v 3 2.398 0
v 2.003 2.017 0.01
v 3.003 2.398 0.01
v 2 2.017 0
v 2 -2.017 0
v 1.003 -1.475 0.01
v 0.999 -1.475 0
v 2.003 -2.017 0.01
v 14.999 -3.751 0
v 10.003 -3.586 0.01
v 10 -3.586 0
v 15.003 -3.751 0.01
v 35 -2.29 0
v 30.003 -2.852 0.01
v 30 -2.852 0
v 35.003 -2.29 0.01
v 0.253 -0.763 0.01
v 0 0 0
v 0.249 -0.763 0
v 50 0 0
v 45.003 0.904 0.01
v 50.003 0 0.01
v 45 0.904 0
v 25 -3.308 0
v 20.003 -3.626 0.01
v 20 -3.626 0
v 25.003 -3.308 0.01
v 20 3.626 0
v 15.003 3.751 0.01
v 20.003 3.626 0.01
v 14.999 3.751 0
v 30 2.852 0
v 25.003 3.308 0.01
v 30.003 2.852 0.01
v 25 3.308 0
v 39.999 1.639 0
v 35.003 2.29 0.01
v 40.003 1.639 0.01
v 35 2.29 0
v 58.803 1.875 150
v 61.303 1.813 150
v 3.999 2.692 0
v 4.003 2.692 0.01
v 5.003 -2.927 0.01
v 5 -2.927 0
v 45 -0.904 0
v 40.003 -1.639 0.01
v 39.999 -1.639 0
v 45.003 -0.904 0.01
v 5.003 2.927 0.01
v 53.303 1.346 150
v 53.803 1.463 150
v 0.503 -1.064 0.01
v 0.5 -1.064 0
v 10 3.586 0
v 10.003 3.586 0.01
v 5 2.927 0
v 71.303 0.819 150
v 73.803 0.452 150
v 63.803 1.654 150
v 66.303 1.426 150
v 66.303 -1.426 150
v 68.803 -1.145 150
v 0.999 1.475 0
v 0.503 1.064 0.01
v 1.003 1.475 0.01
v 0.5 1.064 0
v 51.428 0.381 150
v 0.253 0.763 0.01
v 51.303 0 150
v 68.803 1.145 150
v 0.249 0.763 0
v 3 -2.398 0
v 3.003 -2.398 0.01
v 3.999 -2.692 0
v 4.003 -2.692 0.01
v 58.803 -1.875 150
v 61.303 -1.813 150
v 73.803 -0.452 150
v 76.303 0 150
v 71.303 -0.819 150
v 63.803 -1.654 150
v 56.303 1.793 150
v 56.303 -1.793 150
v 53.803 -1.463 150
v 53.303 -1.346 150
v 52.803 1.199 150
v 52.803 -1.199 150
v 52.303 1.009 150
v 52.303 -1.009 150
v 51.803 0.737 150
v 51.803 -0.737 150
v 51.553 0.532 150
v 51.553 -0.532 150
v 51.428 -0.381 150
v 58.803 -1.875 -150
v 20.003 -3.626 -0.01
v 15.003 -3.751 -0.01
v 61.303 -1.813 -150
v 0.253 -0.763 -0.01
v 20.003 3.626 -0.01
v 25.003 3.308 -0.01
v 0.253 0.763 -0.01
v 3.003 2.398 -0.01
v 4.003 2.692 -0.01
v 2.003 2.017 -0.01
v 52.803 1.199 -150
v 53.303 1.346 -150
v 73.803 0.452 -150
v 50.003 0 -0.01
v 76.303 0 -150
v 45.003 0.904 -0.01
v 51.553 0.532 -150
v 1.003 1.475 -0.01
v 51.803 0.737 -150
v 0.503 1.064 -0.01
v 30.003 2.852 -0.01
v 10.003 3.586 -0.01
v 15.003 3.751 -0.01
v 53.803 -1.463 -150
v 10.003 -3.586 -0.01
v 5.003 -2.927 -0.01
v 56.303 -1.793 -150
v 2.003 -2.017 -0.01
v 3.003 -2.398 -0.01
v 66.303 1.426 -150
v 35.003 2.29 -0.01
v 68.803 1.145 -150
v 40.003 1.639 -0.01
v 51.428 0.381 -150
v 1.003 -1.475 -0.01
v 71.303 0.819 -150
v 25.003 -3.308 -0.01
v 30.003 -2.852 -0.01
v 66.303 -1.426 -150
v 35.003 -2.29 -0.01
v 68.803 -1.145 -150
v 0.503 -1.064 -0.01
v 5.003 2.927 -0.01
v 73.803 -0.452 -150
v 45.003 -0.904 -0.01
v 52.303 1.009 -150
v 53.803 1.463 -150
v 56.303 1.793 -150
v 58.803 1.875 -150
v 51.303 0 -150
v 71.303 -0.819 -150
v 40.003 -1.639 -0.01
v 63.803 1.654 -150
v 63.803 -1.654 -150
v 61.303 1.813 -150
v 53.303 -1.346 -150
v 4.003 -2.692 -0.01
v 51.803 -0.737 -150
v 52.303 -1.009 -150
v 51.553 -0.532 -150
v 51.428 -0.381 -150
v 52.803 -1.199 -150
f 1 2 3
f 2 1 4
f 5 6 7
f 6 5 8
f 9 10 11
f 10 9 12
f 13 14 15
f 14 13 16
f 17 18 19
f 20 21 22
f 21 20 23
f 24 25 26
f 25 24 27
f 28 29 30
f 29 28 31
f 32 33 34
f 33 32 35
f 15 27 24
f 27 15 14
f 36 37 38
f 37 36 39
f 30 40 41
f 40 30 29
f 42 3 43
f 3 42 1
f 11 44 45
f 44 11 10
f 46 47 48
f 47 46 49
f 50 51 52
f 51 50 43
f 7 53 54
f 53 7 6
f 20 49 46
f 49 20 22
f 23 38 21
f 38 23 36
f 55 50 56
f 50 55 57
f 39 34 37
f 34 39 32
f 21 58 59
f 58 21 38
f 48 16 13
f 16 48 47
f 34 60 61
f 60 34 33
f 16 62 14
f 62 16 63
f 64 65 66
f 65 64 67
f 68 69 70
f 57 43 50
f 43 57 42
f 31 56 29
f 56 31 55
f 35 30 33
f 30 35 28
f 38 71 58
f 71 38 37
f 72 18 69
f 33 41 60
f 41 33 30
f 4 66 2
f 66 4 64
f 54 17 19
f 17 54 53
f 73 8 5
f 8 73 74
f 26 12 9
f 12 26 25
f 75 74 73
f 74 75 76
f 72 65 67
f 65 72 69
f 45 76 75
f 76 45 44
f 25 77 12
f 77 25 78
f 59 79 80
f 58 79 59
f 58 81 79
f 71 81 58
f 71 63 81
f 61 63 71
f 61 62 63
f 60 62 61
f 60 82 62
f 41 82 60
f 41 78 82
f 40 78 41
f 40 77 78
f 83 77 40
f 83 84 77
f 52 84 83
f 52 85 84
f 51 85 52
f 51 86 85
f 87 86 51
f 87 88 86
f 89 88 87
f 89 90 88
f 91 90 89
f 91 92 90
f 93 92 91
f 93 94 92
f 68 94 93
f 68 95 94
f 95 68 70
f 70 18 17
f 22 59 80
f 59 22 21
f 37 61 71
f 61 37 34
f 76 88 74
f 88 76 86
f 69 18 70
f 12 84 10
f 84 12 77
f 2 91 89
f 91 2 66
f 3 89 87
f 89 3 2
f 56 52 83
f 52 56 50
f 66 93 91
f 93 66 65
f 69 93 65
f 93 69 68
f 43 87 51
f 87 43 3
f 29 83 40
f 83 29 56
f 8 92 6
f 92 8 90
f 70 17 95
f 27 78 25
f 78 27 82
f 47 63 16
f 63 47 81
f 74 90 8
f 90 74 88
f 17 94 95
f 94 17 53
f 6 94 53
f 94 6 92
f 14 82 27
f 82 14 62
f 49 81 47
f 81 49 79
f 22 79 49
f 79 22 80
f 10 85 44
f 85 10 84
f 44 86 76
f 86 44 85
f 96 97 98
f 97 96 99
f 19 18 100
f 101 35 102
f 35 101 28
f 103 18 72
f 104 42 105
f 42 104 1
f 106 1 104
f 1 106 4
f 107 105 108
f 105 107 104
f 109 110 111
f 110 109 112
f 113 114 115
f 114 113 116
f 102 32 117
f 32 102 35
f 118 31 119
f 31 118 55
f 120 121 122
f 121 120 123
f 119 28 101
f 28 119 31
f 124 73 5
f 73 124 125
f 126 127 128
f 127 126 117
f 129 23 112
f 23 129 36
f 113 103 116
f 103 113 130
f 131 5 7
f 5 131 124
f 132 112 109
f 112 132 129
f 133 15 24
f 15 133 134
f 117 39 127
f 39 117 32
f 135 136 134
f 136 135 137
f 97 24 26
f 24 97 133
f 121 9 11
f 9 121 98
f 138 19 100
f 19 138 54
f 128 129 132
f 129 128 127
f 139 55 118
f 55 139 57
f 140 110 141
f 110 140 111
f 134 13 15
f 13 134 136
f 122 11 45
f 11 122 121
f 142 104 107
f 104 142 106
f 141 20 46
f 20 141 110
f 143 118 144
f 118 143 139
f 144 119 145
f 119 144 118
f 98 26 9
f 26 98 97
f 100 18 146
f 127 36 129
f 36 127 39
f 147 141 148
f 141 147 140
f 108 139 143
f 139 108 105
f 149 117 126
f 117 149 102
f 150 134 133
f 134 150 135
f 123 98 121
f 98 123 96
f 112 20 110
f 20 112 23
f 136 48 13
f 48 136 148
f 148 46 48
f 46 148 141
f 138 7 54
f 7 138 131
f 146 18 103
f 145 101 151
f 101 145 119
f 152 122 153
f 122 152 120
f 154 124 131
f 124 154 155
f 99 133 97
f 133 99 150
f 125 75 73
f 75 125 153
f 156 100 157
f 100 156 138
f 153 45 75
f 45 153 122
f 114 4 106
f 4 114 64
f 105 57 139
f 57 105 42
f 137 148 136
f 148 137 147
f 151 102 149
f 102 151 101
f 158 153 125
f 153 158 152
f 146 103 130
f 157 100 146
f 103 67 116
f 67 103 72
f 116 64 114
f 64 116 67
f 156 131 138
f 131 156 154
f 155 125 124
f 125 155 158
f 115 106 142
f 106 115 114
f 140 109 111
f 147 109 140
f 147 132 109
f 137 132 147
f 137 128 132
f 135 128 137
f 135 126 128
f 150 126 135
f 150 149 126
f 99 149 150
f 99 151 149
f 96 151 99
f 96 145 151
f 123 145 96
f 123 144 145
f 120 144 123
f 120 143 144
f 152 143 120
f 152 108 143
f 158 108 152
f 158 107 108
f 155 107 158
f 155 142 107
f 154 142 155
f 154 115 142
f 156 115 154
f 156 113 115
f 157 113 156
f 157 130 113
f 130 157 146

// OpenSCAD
// [FL_INDEX: keywords="openscad, 3d_parametric, Customizable_Airfoil, csg_solid" | COT="Parametric OpenSCAD design from 3DCodeverse"]
// Title: Customizable Airfoil

// Parametric NACA 00xx airfoil.
// See http://en.wikipedia.org/wiki/NACA_airfoil

// preview[view:south, tilt:top diagonal]

WINGS = 2; // [2:Dual Wings, 1:Single Wing]

// Wing chord (leading edge to trailing edge)
CHORD = 50;

// Wing length (root to tip)
LENGTH = 150;

// Max wing thickness (as percentage of chord length)
t = 15;

// Scale proportion of wing tip vs. wing root
TAPER = 0.5;

// Sweep back angle of wing
SWEEP_ANGLE = 20;

/* [Hidden] */
E = 0.01;

function y(x) = t / 20.0 *
         (.2969 * sqrt(x)
          -0.1260 * x
          -0.3516 * pow(x, 2)
          +0.2843 * pow(x, 3)
          -0.1015 * pow(x, 4));

// Argh!  No for loop initializer in open scad!
a = [[0.0, y(0.0)],
     [0.005, y(0.005)],
     [0.01, y(0.01)],
     [0.02, y(0.02)], [0.04, y(0.04)], [0.06, y(0.06)], [0.08, y(0.08)],
     [0.1, y(0.1)],
     [0.2, y(0.2)],
     [0.3, y(0.3)],
     [0.4, y(0.4)],
     [0.5, y(0.5)],
     [0.6, y(0.6)],
     [0.7, y(0.7)],
     [0.8, y(0.8)],
     [0.9, y(0.9)],
     [1.0, 0.0],
     [0.9, -y(0.9)],
     [0.8, -y(0.8)],
     [0.7, -y(0.7)],
     [0.6, -y(0.6)],
     [0.5, -y(0.5)],
     [0.4, -y(0.4)],
     [0.3, -y(0.3)],
     [0.2, -y(0.2)],
     [0.1, -y(0.1)],
     [0.08, -y(0.08)], [0.06, -y(0.06)], [0.04, -y(0.04)], [0.02, -y(0.02)],
     [0.01, -y(0.01)],
     [0.005, -y(0.005)],
     [0.0, -y(0.0)]
     ];

module naca_2d(chord) {
  scale([chord, chord, 1])
    polygon(points=a);
}

module naca_25d(chord) {
  linear_extrude(height=E) naca_2d(chord);
}

module reflect_z() {
  multmatrix(m=[[1, 0, 0, 0],
                [0, 1, 0, 0],
                [0, 0, -1, 0],
                [0, 0, 0, 1]])
    child(0);
}

module naca(chord, length, taper=1, sweep_ang=0) {
  sweep = sin(sweep_ang);
  multmatrix(m=[ [1, 0, sweep, 0],
                 [0, 1, 0, 0],
                 [0, 0, 1, 0],
                 [0, 0, 0, 1]
               ])
   hull() {
     naca_25d(chord);
     translate([0, 0, length - E])
       scale([taper, taper, 1])
         naca_25d(chord);
  }
}

naca(CHORD, LENGTH, taper=TAPER, sweep_ang=SWEEP_ANGLE);
if (WINGS == 2) {
  reflect_z()
    naca(CHORD, LENGTH, taper=TAPER, sweep_ang=SWEEP_ANGLE);
}
